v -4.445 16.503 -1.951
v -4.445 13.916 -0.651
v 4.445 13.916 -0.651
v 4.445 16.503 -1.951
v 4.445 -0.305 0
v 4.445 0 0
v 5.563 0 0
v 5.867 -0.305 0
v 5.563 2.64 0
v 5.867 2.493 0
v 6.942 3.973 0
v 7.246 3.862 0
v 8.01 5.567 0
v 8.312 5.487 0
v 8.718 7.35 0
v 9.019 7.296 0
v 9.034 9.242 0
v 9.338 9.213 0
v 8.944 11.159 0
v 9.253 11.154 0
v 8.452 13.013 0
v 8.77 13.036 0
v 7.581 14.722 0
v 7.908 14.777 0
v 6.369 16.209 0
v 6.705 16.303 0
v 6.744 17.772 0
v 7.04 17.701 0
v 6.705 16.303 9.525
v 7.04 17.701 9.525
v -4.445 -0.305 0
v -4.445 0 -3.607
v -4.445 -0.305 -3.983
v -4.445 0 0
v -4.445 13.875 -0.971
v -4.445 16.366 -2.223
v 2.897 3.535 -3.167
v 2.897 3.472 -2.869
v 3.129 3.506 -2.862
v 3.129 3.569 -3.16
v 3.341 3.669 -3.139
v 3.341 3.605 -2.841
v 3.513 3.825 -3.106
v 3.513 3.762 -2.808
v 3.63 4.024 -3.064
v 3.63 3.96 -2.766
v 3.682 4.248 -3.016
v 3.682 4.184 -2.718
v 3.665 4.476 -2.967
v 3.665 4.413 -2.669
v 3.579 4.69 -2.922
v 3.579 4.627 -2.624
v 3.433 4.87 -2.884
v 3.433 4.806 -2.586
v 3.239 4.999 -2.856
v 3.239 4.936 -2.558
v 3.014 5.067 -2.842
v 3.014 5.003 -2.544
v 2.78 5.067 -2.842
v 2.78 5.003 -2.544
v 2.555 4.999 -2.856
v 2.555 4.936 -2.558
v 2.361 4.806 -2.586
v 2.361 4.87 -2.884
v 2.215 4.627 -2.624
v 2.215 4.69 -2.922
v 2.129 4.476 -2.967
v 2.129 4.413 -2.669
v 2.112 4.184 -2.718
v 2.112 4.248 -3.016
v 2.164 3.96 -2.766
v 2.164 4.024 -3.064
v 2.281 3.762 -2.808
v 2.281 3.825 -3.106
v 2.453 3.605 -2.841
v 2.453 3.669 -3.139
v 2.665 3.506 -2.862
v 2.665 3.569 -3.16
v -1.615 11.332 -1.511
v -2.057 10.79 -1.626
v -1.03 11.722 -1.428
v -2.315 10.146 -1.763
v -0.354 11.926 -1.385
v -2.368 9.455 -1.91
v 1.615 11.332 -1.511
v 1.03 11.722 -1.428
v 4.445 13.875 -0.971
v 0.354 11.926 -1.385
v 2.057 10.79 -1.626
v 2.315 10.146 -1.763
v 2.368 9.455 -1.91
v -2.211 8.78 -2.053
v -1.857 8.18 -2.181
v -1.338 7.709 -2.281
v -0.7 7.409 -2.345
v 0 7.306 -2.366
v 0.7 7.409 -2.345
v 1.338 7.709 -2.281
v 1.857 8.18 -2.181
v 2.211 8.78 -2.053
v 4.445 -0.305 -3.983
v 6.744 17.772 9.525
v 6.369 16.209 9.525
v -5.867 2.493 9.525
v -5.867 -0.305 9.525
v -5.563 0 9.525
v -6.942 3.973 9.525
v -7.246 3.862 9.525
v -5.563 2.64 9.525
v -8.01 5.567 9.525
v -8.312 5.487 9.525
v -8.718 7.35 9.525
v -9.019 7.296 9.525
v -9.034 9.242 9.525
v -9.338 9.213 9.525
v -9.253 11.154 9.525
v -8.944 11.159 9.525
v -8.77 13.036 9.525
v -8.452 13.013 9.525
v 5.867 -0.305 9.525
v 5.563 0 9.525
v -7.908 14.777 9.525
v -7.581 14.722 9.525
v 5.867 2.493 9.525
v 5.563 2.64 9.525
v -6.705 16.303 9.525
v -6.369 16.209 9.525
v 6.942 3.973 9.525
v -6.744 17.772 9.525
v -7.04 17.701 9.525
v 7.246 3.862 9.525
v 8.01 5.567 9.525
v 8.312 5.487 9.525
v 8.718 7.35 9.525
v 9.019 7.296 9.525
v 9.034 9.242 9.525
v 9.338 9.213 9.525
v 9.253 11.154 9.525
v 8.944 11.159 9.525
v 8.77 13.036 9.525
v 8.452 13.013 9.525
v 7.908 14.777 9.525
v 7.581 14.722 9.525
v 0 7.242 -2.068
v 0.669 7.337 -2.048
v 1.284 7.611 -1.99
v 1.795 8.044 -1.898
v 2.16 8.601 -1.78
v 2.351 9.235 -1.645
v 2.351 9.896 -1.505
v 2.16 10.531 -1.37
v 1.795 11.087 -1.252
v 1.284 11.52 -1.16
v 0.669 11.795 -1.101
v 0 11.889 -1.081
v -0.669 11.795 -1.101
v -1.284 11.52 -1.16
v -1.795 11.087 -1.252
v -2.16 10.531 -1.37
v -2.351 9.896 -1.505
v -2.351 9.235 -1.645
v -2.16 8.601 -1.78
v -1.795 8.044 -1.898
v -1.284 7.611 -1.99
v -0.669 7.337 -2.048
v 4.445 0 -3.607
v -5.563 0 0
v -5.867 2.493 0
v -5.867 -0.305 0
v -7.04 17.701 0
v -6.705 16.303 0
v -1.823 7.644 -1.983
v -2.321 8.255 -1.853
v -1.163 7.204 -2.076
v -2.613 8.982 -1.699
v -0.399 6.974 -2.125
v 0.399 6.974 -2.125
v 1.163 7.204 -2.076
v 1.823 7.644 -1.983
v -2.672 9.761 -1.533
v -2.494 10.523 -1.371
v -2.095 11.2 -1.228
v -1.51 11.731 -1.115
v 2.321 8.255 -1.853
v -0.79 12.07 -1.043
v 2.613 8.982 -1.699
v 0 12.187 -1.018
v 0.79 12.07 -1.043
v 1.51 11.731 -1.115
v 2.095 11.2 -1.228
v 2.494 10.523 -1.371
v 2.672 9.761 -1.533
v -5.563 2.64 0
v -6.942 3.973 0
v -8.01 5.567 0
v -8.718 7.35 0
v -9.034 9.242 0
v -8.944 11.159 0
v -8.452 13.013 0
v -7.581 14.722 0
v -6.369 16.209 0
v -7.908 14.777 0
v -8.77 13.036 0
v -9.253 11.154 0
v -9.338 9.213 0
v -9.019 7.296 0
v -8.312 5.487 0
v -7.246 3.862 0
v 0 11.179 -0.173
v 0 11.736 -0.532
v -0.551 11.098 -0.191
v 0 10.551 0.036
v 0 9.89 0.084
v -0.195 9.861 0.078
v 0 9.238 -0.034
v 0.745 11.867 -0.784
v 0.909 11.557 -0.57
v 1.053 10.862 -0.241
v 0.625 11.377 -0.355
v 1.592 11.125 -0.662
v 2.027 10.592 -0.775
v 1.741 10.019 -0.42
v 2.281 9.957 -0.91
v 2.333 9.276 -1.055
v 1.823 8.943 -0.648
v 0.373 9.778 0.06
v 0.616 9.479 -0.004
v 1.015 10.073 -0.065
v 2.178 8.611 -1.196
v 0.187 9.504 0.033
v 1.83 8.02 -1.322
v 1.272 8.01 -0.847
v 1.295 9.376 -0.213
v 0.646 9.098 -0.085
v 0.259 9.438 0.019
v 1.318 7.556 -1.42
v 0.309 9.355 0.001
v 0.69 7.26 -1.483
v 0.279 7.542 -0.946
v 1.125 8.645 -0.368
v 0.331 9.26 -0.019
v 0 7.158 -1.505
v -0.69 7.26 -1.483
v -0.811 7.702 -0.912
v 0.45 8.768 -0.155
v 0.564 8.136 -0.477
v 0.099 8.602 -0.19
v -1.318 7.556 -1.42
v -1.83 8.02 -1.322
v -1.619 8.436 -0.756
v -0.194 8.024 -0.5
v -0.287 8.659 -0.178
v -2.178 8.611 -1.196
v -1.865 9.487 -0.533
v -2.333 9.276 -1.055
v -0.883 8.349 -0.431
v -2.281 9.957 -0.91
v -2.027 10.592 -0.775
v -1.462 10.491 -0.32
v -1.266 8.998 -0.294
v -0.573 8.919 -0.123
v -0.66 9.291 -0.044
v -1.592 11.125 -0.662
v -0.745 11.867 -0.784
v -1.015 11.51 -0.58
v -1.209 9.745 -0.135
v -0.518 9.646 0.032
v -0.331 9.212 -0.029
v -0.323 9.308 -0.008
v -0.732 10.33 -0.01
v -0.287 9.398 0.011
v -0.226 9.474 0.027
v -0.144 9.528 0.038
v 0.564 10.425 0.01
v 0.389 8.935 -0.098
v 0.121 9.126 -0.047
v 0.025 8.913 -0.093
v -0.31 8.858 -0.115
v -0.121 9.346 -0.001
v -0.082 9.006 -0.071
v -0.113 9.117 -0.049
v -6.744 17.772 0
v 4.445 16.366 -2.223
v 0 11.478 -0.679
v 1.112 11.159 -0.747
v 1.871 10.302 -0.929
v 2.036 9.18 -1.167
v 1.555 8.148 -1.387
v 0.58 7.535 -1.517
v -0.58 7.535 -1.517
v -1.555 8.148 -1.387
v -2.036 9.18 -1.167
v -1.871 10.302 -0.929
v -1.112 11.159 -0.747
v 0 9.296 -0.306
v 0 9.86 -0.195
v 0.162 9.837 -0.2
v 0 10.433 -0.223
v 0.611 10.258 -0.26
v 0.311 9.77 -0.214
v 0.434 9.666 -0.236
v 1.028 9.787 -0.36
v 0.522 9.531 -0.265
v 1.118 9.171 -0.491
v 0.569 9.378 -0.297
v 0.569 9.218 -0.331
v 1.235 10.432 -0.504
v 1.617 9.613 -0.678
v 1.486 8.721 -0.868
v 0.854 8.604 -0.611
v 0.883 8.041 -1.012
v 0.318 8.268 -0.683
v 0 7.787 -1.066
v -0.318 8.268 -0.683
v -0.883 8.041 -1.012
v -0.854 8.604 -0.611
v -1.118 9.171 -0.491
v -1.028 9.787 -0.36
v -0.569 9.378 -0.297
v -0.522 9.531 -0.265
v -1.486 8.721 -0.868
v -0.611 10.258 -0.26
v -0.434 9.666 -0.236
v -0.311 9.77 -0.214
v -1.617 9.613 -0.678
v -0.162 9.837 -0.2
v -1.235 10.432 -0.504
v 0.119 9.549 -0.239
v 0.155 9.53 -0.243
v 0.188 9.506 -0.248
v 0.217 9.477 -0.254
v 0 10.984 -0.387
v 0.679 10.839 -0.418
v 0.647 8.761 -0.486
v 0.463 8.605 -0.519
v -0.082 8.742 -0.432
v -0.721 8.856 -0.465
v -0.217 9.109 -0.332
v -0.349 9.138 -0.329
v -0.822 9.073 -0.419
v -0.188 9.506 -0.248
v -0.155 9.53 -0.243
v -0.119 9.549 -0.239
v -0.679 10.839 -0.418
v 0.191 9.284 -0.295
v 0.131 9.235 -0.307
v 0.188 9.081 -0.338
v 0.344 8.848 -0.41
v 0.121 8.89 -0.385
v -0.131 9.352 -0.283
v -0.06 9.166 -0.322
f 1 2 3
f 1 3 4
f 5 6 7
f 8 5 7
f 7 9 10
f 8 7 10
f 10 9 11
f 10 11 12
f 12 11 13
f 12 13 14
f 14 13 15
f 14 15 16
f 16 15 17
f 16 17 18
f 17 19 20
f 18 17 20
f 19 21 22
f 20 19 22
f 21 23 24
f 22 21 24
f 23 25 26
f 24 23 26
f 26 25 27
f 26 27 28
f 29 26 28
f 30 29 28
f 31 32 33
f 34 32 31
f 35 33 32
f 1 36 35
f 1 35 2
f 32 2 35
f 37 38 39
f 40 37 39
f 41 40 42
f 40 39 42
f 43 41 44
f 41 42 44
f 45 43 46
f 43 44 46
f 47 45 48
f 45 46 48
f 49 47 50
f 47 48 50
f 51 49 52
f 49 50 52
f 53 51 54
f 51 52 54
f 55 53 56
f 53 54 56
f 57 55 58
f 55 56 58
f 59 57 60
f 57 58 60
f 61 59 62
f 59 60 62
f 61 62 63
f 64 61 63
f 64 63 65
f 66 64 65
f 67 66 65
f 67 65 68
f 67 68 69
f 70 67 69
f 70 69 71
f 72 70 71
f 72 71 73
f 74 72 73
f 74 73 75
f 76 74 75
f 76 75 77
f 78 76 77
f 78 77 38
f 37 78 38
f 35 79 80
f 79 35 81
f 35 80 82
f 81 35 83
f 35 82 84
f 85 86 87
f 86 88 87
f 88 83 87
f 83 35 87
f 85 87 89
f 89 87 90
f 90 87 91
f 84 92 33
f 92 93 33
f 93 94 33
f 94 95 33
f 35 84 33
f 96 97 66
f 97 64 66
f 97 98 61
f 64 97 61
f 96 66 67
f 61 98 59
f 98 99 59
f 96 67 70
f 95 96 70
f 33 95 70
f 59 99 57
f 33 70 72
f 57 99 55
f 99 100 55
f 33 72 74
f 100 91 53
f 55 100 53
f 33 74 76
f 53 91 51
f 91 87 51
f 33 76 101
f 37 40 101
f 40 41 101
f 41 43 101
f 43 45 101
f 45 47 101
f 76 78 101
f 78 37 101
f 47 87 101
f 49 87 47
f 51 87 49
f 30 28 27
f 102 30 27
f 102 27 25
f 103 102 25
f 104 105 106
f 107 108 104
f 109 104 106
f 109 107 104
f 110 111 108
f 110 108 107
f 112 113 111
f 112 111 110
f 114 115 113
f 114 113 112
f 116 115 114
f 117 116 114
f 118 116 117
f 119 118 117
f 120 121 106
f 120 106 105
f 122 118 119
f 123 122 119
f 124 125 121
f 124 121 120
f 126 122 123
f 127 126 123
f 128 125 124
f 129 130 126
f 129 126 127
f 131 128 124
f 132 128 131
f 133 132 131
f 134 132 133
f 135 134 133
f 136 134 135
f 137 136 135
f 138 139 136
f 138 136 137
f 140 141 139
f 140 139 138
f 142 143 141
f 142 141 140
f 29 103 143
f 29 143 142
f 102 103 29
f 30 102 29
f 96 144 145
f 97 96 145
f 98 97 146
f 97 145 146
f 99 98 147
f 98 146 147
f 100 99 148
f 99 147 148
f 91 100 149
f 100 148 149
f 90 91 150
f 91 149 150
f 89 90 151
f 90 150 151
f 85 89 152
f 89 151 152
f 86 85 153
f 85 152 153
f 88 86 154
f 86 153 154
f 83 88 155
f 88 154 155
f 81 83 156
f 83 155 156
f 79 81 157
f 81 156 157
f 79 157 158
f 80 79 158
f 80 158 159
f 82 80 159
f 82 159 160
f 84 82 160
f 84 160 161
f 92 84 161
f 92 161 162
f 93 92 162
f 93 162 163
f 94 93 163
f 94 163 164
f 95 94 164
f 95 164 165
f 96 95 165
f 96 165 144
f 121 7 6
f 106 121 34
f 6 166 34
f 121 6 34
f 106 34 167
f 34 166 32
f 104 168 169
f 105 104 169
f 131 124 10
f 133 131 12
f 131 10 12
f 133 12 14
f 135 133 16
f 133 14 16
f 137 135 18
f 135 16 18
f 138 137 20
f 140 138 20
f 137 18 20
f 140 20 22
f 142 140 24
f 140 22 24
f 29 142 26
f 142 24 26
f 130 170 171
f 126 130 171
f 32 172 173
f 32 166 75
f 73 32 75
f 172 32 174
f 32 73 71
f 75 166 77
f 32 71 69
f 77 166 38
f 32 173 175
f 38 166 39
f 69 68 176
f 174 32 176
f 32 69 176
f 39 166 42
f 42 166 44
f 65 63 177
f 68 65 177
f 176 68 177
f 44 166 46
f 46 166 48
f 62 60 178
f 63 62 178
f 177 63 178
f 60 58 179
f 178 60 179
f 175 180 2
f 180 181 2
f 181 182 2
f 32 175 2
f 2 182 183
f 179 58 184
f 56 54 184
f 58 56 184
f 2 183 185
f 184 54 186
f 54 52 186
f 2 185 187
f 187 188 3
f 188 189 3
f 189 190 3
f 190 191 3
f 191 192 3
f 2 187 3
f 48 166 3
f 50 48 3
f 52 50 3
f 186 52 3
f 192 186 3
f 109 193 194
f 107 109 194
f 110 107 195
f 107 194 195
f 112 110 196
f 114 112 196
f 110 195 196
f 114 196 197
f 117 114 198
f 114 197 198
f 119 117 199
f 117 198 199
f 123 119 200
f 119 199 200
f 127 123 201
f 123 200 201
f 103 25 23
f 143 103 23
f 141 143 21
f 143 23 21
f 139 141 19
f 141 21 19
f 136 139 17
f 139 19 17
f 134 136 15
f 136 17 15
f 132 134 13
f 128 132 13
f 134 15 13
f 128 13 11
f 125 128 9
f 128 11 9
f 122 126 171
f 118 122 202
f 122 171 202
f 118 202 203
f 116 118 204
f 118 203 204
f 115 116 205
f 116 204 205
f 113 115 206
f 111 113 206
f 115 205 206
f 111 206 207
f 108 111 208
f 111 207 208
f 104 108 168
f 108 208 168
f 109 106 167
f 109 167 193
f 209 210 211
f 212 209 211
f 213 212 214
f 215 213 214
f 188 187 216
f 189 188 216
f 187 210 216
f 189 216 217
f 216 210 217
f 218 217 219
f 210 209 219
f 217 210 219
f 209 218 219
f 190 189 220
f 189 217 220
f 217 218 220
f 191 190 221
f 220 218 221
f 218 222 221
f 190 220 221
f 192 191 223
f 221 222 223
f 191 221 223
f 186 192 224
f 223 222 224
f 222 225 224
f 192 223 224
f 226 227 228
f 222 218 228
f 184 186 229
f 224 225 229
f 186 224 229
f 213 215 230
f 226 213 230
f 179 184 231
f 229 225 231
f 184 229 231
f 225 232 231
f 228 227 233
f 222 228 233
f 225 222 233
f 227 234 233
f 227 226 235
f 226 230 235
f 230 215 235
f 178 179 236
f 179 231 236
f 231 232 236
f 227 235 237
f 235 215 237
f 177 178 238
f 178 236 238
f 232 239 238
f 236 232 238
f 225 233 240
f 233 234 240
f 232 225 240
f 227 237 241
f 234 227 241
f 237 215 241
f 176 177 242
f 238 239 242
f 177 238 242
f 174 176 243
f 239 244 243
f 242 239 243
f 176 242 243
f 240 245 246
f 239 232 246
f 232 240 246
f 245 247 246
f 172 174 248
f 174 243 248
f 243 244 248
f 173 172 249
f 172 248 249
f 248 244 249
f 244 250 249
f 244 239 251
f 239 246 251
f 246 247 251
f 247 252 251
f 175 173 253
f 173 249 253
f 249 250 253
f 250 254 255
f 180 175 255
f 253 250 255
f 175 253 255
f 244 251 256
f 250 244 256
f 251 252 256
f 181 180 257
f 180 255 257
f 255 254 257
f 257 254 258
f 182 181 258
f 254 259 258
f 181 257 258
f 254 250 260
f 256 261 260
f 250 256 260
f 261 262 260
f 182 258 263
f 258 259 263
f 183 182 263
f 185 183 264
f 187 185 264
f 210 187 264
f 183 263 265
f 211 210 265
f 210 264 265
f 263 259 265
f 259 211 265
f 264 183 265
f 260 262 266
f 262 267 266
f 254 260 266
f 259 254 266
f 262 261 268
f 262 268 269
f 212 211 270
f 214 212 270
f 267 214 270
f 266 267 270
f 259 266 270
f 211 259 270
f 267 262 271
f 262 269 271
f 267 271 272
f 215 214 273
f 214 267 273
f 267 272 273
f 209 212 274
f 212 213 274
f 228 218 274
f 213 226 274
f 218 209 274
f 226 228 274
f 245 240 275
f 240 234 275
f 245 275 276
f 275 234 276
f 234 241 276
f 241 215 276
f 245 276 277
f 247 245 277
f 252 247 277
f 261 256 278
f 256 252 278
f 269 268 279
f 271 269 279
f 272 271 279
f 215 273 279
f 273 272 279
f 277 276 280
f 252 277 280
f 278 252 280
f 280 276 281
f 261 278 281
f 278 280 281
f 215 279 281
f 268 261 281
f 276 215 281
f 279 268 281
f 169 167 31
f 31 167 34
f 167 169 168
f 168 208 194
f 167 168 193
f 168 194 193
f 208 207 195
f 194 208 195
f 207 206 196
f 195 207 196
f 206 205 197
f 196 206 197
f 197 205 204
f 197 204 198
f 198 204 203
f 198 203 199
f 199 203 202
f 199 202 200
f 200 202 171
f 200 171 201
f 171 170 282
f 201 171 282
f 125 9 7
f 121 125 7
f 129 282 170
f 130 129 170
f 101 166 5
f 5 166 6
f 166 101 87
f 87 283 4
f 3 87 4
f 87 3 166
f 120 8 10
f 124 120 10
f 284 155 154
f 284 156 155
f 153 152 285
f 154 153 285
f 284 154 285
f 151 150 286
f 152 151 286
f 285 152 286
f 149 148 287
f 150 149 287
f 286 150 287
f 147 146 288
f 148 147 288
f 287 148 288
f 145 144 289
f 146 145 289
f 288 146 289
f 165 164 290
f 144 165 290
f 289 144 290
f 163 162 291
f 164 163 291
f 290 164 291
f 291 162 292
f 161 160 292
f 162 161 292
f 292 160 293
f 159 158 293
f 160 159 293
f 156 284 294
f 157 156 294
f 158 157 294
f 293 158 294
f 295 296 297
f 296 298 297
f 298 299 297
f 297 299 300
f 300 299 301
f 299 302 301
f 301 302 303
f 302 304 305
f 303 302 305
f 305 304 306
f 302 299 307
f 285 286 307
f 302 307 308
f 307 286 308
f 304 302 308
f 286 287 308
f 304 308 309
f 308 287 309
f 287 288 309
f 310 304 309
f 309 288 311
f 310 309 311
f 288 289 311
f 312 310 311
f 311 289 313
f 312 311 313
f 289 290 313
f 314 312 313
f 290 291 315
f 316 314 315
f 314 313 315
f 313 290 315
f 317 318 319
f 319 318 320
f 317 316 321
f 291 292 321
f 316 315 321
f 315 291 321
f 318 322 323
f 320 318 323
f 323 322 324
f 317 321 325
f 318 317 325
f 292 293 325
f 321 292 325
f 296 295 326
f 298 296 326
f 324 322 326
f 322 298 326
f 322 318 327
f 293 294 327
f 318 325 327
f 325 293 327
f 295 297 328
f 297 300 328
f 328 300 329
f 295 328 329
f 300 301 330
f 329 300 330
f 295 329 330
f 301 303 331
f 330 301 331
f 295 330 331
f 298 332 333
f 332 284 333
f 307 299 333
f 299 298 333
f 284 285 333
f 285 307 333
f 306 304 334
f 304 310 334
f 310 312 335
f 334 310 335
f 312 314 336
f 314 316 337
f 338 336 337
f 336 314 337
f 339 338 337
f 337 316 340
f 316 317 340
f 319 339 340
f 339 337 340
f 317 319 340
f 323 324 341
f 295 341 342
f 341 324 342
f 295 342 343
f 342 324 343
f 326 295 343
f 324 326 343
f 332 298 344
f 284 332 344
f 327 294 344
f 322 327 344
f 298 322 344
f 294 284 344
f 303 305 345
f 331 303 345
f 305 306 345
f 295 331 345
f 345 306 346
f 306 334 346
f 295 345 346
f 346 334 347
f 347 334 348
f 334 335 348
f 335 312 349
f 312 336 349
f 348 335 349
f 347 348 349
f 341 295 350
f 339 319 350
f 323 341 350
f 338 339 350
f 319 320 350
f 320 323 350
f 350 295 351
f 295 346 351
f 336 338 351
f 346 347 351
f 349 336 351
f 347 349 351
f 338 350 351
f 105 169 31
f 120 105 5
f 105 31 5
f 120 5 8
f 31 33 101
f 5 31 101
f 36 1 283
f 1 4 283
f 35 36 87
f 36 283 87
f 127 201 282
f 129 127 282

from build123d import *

# Parameters (mm, degrees)
EXTRUDE_THIN1_DEPTH = 9.525
EXTRUDE_THIN2_DEPTH = 4.445
SKETCH3_R           = 2.3749
SKETCH3_R_2         = 0.7874
CUT_EXTRUDE1_DEPTH  = 24.37151185


with BuildPart() as part:
    # Sketch1 → Extrude-Thin1 (new body)
    with BuildSketch(Plane.XY):
        with BuildLine():
            Line((6.7437, 17.77238356), (6.368570529, 16.208915196))
            ThreePointArc((6.368570529, 16.208915196), (9.034076329, 9.242376411), (5.5626, 2.640373995))
            Line((5.5626, 2.640373995), (5.5626, 0))
            Line((5.5626, 0), (-5.5626, 0))
            Line((-5.5626, 0), (-5.5626, 2.640373995))
            ThreePointArc((-5.5626, 2.640373995), (-9.034076329, 9.242376411), (-6.368570529, 16.208915196))
            Line((-6.368570529, 16.208915196), (-6.7437, 17.77238356))
            Line((-6.7437, 17.77238356), (-7.040088077, 17.701269935))
            Line((-7.040088077, 17.701269935), (-6.704567446, 16.30288369))
            ThreePointArc((-6.704567446, 16.30288369), (-9.337658307, 9.212943132), (-5.8674, 2.492992844))
            Line((-5.8674, 2.492992844), (-5.8674, -0.3048))
            Line((-5.8674, -0.3048), (5.8674, -0.3048))
            Line((5.8674, -0.3048), (5.8674, 2.492992844))
            ThreePointArc((5.8674, 2.492992844), (9.337658307, 9.212943132), (6.704567446, 16.30288369))
            Line((6.704567446, 16.30288369), (7.040088077, 17.701269935))
            Line((7.040088077, 17.701269935), (6.7437, 17.77238356))
        make_face()
    extrude(amount=EXTRUDE_THIN1_DEPTH)

    # Sketch2 → Extrude-Thin2 (add, symmetric)
    with BuildSketch(Plane(origin=(0, 0, 0), x_dir=(0, 0, -1), z_dir=(1, 0, 0))):
        Polygon((0, 0), (3.6068, 0), (0.650543656, 13.916451143), (1.950898512, 16.503333624), (2.223228171, 16.366440976), (0.970920321, 13.875141604), (3.983149653, -0.3048), (0, -0.3048), align=None)
    extrude(amount=EXTRUDE_THIN2_DEPTH, both=True)

    # Sketch3 → Cut-Extrude1 (cut, through all)
    with BuildSketch(Plane(origin=(0, 0.733106356, -3.451067026), x_dir=(1, 0, 0), z_dir=(0, -0.2077922077922076, 0.9781729900078207))):
        with Locations(Location((0, 9.029535065, 0), (0, 0, 270))):
            Circle(SKETCH3_R)
        with Locations(Location((2.89696051, 3.586960276, 0), (0, 0, 270))):
            Circle(SKETCH3_R_2)
    extrude(amount=-CUT_EXTRUDE1_DEPTH, mode=Mode.SUBTRACT)

    # Sketch4 → Revolve2 (revolve)
    with BuildSketch(Plane(origin=(0, 0, 0), x_dir=(0, 0, -1), z_dir=(1, 0, 0))):
        with BuildLine():
            Line((0.034373175, 9.2383225), (0.305728617, 9.295966237))
            ThreePointArc((0.305728617, 9.295966237), (0.288117278, 10.713567235), (1.081314286, 11.888616703))
            Line((1.081314286, 11.888616703), (1.017979221, 12.186763831))
            ThreePointArc((1.017979221, 12.186763831), (0.048720075, 10.871823503), (0.034373175, 9.2383225))
        make_face()
    revolve(axis=Axis((0, 9.2383225, -0.034373175), (0, 0.20779220779220853, -0.9781729900078205)))


solid = part.part
